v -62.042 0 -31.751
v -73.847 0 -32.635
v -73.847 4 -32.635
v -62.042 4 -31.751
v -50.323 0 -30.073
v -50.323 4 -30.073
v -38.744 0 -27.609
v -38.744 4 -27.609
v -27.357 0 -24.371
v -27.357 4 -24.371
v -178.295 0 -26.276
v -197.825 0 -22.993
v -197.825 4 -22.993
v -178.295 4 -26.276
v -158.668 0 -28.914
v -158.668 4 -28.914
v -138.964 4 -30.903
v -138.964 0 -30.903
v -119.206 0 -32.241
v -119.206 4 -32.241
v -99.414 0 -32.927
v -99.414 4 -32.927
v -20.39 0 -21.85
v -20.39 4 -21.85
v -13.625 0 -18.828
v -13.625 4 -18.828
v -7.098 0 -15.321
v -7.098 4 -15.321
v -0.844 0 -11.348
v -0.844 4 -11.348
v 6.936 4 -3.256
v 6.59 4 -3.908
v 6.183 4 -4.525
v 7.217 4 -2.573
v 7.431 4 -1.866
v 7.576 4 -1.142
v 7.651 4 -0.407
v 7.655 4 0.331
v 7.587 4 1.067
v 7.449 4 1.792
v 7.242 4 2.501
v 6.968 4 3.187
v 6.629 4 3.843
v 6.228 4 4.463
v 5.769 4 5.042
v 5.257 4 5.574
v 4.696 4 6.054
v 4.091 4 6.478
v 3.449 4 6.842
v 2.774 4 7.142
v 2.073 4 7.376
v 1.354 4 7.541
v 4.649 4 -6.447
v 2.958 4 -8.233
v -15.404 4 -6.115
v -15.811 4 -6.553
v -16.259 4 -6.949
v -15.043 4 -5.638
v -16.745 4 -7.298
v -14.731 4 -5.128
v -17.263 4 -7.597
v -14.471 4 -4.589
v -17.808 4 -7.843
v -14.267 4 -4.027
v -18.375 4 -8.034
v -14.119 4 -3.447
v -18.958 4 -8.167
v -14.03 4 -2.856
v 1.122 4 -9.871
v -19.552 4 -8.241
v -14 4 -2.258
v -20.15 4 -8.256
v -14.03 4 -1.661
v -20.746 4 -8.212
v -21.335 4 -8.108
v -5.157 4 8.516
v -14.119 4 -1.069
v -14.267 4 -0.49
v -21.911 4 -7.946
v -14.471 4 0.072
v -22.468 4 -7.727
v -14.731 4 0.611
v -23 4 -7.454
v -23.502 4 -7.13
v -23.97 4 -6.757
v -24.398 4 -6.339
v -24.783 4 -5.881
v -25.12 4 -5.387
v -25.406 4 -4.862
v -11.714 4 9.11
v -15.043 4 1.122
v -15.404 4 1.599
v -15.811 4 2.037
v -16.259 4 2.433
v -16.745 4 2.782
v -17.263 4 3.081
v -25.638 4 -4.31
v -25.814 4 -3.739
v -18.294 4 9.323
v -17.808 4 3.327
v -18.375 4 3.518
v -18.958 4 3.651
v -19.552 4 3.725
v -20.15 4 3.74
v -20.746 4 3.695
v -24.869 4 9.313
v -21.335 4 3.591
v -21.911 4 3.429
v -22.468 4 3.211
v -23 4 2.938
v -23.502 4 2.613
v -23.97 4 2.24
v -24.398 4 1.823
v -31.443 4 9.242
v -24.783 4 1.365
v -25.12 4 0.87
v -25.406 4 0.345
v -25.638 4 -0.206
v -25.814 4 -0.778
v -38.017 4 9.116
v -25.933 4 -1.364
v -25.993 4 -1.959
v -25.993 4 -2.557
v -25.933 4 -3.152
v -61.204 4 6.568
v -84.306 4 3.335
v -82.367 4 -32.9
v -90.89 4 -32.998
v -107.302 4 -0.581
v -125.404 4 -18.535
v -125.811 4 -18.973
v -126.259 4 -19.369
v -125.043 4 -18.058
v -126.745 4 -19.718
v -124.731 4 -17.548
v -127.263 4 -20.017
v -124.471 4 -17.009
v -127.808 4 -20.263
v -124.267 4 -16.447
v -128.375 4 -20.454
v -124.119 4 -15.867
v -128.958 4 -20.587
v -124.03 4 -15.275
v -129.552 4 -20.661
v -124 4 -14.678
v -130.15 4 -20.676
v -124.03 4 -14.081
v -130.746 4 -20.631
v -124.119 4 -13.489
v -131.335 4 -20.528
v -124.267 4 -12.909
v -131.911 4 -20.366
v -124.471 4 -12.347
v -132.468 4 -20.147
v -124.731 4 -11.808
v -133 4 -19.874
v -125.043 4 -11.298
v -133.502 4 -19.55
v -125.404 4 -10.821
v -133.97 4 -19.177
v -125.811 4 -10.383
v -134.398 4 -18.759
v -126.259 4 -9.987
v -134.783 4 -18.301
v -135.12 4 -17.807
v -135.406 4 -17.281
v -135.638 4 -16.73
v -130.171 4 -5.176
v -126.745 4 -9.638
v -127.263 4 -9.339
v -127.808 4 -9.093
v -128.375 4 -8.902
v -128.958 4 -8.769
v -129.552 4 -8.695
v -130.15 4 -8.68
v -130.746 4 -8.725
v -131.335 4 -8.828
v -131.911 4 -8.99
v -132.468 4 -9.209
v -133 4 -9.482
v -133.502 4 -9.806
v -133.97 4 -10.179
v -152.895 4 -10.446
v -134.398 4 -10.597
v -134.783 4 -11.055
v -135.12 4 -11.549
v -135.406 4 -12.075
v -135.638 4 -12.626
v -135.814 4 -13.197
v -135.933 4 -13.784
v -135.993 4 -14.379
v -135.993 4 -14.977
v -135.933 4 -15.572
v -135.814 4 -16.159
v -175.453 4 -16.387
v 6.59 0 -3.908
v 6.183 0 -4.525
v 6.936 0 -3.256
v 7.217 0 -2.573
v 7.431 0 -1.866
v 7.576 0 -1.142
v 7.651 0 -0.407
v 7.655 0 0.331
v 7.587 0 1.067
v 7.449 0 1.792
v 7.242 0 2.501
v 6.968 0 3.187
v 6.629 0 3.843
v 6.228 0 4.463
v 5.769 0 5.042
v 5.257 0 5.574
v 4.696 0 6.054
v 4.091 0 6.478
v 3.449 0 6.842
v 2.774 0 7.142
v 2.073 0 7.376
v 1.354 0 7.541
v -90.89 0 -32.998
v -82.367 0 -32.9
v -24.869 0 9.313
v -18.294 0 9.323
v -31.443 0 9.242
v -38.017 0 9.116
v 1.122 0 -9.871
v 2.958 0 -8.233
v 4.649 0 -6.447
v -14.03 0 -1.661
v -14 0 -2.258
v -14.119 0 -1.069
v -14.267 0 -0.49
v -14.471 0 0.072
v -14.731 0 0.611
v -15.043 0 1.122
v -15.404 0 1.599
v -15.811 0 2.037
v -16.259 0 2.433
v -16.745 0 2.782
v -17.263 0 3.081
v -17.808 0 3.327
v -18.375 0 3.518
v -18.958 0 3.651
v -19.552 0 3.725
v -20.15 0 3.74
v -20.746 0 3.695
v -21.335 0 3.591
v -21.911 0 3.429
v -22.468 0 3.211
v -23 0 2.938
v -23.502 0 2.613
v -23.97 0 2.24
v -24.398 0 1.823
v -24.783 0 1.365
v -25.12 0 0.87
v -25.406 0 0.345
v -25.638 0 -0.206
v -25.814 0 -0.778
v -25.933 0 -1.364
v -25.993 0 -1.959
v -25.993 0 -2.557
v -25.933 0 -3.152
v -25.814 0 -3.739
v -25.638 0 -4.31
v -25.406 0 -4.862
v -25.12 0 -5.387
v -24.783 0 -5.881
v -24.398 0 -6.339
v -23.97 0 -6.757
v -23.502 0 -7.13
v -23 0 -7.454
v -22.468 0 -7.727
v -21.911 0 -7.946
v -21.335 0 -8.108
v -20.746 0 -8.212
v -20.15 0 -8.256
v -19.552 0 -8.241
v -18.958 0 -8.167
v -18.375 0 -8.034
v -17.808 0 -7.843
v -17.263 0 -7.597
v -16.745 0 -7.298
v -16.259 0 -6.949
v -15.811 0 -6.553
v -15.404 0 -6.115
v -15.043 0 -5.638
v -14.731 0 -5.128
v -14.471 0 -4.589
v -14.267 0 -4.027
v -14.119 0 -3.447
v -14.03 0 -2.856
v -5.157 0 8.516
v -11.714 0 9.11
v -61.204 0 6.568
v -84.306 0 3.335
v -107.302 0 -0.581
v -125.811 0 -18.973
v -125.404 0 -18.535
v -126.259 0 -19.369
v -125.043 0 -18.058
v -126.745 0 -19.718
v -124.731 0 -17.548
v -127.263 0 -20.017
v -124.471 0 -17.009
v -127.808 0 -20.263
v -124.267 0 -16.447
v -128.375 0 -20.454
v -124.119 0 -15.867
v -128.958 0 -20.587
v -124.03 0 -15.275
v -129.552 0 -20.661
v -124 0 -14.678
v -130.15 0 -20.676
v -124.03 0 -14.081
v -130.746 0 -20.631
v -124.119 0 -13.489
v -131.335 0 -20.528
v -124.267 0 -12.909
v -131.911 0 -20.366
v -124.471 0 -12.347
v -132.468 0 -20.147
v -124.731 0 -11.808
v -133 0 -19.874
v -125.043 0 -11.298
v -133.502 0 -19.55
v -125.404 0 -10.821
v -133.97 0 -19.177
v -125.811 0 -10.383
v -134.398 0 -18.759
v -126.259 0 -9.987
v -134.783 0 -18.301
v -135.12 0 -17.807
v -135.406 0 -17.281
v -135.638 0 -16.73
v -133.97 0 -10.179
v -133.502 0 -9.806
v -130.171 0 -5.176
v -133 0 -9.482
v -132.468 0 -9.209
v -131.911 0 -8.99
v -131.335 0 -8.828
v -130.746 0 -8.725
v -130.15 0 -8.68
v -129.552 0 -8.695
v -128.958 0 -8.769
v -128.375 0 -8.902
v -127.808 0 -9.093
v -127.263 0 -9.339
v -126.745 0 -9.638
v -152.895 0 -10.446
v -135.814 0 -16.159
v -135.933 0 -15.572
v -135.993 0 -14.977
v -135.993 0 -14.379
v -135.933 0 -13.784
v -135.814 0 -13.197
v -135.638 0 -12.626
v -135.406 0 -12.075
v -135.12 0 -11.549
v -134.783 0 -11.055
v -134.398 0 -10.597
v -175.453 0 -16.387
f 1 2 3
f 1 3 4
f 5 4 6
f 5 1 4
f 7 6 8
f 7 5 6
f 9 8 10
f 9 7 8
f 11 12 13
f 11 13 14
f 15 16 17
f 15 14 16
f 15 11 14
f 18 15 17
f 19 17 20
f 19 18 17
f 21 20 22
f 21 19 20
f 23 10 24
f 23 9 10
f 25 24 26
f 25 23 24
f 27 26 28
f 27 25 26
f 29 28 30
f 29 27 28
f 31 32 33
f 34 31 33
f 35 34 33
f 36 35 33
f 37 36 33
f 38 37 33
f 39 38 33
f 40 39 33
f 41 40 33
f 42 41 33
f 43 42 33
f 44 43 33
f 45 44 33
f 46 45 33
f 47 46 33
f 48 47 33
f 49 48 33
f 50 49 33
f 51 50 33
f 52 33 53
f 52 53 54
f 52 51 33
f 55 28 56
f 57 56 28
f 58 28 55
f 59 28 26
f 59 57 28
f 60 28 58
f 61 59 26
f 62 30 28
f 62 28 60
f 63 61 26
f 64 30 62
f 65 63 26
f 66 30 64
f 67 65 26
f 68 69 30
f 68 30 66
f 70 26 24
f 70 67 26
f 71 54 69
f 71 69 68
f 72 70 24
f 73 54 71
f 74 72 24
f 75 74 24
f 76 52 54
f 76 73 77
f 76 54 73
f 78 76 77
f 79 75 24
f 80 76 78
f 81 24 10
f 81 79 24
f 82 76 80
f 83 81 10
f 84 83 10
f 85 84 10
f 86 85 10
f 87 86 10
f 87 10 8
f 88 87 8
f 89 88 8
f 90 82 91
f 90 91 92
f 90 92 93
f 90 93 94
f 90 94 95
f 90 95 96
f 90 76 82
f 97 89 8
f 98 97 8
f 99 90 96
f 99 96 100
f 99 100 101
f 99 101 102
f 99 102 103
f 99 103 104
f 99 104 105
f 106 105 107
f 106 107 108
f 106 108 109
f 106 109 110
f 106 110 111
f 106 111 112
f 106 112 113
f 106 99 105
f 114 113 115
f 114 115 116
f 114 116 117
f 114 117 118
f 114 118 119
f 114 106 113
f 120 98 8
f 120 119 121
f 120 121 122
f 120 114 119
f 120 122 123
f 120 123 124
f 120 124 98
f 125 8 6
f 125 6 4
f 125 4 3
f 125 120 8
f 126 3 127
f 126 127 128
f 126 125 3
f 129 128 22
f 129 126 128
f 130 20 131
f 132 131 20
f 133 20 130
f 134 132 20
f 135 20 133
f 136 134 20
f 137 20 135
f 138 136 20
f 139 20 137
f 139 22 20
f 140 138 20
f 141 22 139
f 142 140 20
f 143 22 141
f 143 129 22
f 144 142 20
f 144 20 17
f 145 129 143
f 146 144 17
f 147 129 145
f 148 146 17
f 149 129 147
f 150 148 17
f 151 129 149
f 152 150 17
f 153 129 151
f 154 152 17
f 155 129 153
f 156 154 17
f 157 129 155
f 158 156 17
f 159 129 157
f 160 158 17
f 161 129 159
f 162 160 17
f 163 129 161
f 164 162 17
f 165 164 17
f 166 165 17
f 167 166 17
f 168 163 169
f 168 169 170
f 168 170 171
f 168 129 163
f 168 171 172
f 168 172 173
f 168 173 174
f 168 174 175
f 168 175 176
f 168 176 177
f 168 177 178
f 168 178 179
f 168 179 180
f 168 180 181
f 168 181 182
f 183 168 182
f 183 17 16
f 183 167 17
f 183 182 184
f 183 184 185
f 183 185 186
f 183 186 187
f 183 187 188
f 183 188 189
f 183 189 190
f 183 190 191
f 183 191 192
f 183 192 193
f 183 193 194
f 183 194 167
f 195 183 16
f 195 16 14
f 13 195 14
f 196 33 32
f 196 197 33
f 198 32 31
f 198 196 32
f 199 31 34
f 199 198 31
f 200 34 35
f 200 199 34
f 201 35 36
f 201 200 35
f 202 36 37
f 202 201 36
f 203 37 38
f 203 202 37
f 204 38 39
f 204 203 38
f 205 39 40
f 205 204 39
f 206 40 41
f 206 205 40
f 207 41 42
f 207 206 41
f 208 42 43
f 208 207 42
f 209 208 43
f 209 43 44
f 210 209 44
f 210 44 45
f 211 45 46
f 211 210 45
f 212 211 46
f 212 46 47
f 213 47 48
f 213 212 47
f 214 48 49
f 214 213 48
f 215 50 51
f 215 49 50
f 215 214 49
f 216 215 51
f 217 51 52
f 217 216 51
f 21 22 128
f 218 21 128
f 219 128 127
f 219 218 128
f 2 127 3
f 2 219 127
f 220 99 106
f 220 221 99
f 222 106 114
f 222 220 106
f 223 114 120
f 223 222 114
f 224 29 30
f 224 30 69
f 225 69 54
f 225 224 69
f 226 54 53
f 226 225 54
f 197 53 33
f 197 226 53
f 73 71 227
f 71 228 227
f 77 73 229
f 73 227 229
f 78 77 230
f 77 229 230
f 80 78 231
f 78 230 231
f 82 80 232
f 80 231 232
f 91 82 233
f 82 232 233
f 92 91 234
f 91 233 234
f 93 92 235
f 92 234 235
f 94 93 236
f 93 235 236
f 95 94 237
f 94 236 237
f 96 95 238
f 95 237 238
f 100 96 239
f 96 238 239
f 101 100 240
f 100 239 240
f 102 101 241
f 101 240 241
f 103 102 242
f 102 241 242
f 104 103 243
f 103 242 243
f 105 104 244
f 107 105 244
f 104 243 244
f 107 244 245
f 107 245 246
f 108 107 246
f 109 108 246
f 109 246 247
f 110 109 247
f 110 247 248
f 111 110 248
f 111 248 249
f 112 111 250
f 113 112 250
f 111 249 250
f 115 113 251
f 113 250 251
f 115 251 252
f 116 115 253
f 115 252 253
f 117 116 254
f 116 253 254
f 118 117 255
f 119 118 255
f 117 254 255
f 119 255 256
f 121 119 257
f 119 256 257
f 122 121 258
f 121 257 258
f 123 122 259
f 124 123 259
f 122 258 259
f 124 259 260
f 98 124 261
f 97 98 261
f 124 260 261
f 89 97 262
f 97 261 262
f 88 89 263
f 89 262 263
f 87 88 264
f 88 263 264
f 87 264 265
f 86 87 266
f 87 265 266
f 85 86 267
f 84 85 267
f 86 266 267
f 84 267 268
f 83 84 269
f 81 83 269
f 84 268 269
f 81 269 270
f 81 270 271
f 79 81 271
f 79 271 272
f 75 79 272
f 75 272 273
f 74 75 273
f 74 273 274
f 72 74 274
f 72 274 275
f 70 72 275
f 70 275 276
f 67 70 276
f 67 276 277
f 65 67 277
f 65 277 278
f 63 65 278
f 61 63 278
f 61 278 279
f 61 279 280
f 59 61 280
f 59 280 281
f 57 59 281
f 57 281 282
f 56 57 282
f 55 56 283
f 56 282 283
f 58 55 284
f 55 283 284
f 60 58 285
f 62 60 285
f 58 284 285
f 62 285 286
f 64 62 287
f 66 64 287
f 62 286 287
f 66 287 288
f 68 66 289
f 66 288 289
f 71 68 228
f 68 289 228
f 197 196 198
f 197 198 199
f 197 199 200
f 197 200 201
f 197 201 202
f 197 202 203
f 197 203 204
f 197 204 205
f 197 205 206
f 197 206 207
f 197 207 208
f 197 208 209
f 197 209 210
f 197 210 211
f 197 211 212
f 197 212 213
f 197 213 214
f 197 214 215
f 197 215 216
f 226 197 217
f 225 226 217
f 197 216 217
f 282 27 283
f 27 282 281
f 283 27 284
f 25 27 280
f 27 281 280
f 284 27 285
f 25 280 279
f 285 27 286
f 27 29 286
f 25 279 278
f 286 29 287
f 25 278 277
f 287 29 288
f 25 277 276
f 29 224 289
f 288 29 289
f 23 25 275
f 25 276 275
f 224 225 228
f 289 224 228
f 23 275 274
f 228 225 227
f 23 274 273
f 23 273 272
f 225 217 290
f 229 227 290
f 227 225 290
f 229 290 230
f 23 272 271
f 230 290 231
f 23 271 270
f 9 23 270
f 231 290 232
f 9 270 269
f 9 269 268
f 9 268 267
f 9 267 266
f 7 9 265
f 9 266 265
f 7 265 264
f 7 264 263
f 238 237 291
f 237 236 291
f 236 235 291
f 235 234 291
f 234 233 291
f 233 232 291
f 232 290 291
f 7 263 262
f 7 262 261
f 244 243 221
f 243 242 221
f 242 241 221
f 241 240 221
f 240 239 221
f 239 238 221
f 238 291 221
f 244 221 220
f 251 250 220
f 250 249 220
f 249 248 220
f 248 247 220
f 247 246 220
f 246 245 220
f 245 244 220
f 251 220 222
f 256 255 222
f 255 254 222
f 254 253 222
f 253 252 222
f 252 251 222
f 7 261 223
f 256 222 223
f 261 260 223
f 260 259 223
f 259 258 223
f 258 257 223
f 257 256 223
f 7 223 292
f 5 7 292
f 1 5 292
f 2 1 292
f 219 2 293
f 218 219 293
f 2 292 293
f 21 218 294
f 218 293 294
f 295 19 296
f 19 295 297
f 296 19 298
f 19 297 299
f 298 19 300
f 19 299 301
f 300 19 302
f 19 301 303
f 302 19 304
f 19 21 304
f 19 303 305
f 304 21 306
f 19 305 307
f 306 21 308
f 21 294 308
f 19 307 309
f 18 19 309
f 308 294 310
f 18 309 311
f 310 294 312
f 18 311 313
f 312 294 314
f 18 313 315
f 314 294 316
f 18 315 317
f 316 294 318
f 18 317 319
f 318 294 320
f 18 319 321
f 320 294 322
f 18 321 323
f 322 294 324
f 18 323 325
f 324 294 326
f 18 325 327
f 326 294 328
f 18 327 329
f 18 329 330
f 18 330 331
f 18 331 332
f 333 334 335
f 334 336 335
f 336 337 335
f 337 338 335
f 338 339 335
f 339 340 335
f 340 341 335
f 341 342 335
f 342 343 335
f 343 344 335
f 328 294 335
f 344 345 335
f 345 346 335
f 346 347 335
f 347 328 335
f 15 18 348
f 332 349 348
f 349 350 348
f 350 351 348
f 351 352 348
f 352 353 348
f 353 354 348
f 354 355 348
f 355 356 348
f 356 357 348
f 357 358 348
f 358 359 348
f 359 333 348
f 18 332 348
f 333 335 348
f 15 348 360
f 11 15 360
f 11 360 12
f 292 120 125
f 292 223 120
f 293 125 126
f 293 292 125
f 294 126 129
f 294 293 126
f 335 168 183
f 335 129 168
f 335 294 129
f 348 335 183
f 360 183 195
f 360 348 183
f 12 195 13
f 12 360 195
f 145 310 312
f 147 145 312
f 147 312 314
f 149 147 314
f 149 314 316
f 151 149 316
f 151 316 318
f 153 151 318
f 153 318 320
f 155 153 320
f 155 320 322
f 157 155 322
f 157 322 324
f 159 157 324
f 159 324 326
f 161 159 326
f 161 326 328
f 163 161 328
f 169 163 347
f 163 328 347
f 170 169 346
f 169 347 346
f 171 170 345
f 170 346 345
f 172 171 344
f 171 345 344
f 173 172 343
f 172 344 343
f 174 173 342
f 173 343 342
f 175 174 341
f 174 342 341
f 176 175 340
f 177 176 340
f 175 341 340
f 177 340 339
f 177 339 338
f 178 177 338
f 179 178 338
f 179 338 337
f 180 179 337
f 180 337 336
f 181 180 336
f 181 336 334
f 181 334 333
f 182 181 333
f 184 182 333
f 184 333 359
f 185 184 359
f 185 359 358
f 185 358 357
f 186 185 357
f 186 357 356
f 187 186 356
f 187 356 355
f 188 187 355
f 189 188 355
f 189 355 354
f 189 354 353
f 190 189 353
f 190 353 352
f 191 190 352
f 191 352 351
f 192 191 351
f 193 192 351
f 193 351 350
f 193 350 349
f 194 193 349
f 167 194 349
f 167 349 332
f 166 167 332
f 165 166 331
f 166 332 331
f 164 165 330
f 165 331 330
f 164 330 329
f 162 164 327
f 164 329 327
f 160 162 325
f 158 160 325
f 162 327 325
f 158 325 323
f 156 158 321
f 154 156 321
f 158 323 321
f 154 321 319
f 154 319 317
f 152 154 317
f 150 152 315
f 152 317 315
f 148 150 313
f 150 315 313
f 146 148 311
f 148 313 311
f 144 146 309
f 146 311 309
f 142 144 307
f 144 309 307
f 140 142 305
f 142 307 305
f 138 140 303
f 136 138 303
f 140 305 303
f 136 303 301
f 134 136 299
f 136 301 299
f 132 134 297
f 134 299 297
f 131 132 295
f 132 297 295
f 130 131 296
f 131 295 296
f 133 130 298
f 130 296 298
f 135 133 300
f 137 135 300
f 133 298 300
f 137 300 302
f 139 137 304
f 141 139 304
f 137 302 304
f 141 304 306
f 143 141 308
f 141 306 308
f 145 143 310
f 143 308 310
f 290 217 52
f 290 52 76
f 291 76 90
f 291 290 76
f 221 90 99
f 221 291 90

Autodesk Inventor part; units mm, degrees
ref_plane "YZ Plane" through (0, 0, 0) normal (1, 0, 0) x (0, 1, 0)
ref_plane "XZ Plane" through (0, 0, 0) normal (0, 1, 0) x (-1, 0, 0)
ref_plane "XY Plane" through (0, 0, 0) normal (0, 0, 1) x (1, 0, 0)
sketch "スケッチ1" plane through (0, 0, 0) normal (0, 1, 0) x (-1, 0, 0)
  arc A0 (209.8798, -23.6971) -> (38.3003, 12.1023) centre (-36.3979, -774.9853) ccw projected
  arc A1 (99.4686, -35.9265) -> (209.8798, -23.6971) centre (88.5018, 567.6156) ccw projected
  arc A2 (73.7238, -35.6322) -> (99.4686, -35.9265) centre (91.566, 398.982) ccw projected
  arc A3 (26.4399, -27.2272) -> (73.7238, -35.6322) centre (81.048, 142.776) ccw projected
  arc A4 (-0.8557, -13.8205) -> (26.4399, -27.2272) centre (58.458, 72.45) ccw projected
  arc A5 (-8.6045, -6.2961) -> (-0.8557, -13.8205) centre (17.4, 12.732) ccw projected
  arc A6 (-1.8835, 10.4943) -> (-8.6045, -6.2961) centre (0, 0) ccw projected
  arc A7 (18.284, 12.3227) -> (-1.8835, 10.4943) centre (18.66, -103.968) ccw projected
  arc A8 (38.3003, 12.1023) -> (18.284, 12.3227) centre (20.556, -690.396) ccw projected
extrude "押し出し1" add sketch "スケッチ1" along normal blind 4
sketch "スケッチ2" plane through (0, 0, 0) normal (0, -1, 0) x (1, 0, 0)
  circle A0 centre (-20, -2.2582) radius 6
  circle A1 centre (-130, -14.678) radius 6
  line L0 (0, 0) -> (-209.8798, -23.6971)
  dimension "d3" = 12
  dimension "d4" = 12
  dimension "d5" = 20
  dimension "d6" = 130
extrude "押し出し2" cut sketch "スケッチ2" against normal through all
thicken "厚み1" operation cut thickness 3 both sides no extend neighbours no toward (0.2114907, 0, -0.97738) faces at (-130.8117, 2.6667, -2.245) (-36.0766, 2.6667, 12.1549) (-0.3377, 1.3333, 10.8708) (9.052, 1.3333, -5.6337) (1.8363, 1.3333, -13.1189) (-10.787, 2.6667, -20.7604) (-68.3801, 1.3333, -35.3326) (-85.1636, 2.6667, -35.9512) (-200.7848, 1.3333, -25.4914)
equation "\"d4\" = d3"
properties part number "plate" material "木材 (オーク)"
